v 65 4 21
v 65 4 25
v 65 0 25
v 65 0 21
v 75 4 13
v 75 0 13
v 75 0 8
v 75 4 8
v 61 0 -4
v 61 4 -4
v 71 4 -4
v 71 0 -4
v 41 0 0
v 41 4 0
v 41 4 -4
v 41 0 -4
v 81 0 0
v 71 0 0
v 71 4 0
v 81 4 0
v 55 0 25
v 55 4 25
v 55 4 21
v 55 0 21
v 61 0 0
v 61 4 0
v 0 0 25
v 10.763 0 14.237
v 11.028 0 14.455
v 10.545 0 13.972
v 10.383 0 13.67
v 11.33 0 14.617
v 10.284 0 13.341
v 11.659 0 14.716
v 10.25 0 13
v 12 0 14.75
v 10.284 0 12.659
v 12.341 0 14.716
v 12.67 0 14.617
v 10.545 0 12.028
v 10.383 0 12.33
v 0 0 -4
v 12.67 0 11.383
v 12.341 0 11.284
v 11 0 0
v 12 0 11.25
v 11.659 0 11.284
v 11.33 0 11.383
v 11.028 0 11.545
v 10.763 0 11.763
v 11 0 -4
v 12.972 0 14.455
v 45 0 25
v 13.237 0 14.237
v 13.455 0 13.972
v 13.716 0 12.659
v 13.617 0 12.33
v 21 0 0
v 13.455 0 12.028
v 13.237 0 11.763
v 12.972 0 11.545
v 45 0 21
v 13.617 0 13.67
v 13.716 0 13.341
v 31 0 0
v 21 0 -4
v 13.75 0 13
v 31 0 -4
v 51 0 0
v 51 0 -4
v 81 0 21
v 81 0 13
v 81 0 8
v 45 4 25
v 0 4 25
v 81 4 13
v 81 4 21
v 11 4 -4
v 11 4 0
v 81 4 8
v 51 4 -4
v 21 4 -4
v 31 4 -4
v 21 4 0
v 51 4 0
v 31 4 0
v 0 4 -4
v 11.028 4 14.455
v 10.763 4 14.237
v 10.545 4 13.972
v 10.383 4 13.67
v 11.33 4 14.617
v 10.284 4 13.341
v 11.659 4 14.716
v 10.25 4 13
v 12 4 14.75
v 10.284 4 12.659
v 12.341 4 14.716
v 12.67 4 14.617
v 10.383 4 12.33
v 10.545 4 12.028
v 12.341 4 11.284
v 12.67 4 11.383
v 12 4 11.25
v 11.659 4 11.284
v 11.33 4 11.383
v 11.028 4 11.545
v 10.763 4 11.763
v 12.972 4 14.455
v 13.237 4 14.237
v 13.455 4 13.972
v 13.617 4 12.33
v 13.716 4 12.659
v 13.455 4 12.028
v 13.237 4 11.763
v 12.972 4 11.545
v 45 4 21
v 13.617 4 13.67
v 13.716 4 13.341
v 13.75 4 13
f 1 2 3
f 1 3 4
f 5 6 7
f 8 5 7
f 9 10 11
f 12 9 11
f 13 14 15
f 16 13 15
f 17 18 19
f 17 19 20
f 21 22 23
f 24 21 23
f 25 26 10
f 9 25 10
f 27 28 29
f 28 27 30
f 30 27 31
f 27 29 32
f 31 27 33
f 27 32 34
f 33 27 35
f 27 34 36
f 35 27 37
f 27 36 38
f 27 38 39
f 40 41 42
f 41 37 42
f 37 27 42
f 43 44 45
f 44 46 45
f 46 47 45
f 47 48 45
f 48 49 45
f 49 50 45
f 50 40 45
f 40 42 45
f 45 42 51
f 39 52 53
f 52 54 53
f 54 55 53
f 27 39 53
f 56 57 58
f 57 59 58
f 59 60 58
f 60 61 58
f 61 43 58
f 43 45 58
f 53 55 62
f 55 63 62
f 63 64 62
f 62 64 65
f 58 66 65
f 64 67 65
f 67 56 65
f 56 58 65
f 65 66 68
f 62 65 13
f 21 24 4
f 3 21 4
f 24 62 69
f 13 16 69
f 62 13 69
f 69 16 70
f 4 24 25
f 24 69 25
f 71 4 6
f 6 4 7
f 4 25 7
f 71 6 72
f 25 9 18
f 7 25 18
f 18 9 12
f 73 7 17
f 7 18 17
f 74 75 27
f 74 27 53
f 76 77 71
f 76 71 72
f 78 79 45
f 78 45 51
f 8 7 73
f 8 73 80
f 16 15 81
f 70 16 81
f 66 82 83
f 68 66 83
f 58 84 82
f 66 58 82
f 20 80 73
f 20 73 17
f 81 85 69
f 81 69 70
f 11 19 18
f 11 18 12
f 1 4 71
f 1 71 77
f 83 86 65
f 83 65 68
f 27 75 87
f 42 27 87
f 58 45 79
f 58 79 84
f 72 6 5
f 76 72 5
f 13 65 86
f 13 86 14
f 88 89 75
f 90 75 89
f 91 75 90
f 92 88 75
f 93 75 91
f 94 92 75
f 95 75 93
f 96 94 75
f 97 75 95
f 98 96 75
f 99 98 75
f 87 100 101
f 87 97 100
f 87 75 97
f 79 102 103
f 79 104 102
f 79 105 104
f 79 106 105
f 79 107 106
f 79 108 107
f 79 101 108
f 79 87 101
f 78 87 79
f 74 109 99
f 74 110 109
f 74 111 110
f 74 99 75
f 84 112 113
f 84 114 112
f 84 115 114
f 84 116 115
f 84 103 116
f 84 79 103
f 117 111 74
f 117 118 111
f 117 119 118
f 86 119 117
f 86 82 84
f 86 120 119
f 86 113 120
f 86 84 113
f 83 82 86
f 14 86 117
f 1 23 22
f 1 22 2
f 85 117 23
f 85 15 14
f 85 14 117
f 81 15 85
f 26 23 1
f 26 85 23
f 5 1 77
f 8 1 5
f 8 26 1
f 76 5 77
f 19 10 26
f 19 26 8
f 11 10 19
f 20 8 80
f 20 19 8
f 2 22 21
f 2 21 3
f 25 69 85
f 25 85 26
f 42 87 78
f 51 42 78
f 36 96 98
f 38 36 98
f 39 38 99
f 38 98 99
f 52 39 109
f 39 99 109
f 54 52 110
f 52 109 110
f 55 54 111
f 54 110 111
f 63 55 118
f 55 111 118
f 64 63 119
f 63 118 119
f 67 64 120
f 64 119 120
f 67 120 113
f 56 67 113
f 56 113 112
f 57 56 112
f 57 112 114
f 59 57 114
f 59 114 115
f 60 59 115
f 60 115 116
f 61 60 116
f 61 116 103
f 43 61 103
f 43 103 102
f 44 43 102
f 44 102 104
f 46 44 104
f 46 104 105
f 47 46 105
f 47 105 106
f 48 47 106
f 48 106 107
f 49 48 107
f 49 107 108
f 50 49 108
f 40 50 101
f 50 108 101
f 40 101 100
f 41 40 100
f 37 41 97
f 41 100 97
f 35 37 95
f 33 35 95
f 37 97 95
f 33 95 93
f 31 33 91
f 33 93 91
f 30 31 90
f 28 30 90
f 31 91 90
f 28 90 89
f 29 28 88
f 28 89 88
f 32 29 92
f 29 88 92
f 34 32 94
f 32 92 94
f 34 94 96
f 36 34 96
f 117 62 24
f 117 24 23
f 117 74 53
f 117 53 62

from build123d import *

# Parameters (mm, degrees)
SKETCH1_W           = 75
SKETCH1_H           = 21
BOSS_EXTRUDE1_DEPTH = 4
SKETCH2_W           = 8
SKETCH2_H           = 4
BOSS_EXTRUDE2_DEPTH = 6
SKETCH3_W           = 10
SKETCH3_H           = 4
BOSS_EXTRUDE3_DEPTH = 4
LPATTERN1_COUNT     = 4
LPATTERN1_PITCH     = 20
SKETCH4_W           = 1
SKETCH4_H           = 4
BOSS_EXTRUDE4_DEPTH = 4
SKETCH5_W           = 45
SKETCH5_H           = 4
SKETCH5_W_2         = 10
BOSS_EXTRUDE5_DEPTH = 4
SKETCH6_R           = 1.75
CUT_EXTRUDE1_DEPTH  = 85.864598037


with BuildPart() as part:
    # Sketch1 → Boss-Extrude1 (new body)
    with BuildSketch(Plane(origin=(0, 0, 0), x_dir=(1, 0, 0), z_dir=(0, 1, 0))):
        with Locations((37.5, -10.5)):
            Rectangle(SKETCH1_W, SKETCH1_H)
    extrude(amount=BOSS_EXTRUDE1_DEPTH)

    # Sketch2 → Boss-Extrude2 (add)
    with BuildSketch(Plane(origin=(75, 0, 0), x_dir=(0, 0, -1), z_dir=(1, 0, 0))):
        with Locations((-17, 2)):
            Rectangle(SKETCH2_W, SKETCH2_H)
        with Locations((-4, 2)):
            Rectangle(SKETCH2_W, SKETCH2_H)
    extrude(amount=BOSS_EXTRUDE2_DEPTH)

    # Sketch3 → Boss-Extrude3 (add, through all)
    with BuildSketch(Plane(origin=(0, 4, 0), x_dir=(1, 0, 0), z_dir=(0, 1, 0))):
        with Locations((66, 2)):
            Rectangle(SKETCH3_W, SKETCH3_H)
    boss_extrude3 = extrude(amount=-BOSS_EXTRUDE3_DEPTH)

    # LPattern1: Boss-Extrude3 ×4
    with Locations(*[(-i * LPATTERN1_PITCH, 0, 0) for i in range(1, LPATTERN1_COUNT)]):
        add(boss_extrude3)

    # Sketch4 → Boss-Extrude4 (add, through all)
    with BuildSketch(Plane(origin=(0, 4, 0), x_dir=(1, 0, 0), z_dir=(0, 1, 0))):
        with Locations((0.5, 2)):
            Rectangle(SKETCH4_W, SKETCH4_H)
    extrude(amount=-BOSS_EXTRUDE4_DEPTH)

    # Sketch5 → Boss-Extrude5 (add, through all)
    with BuildSketch(Plane(origin=(0, 4, 0), x_dir=(1, 0, 0), z_dir=(0, 1, 0))):
        with Locations((22.5, -23)):
            Rectangle(SKETCH5_W, SKETCH5_H)
        with Locations((60, -23)):
            Rectangle(SKETCH5_W_2, SKETCH5_H)
    extrude(amount=-BOSS_EXTRUDE5_DEPTH)

    # Sketch6 → Cut-Extrude1 (cut, through all)
    with BuildSketch(Plane(origin=(0, 4, 0), x_dir=(1, 0, 0), z_dir=(0, 1, 0))):
        with Locations(Location((12, -13, 0), (0, 0, 270))):
            Circle(SKETCH6_R)
    extrude(amount=-CUT_EXTRUDE1_DEPTH, mode=Mode.SUBTRACT)


solid = part.part
